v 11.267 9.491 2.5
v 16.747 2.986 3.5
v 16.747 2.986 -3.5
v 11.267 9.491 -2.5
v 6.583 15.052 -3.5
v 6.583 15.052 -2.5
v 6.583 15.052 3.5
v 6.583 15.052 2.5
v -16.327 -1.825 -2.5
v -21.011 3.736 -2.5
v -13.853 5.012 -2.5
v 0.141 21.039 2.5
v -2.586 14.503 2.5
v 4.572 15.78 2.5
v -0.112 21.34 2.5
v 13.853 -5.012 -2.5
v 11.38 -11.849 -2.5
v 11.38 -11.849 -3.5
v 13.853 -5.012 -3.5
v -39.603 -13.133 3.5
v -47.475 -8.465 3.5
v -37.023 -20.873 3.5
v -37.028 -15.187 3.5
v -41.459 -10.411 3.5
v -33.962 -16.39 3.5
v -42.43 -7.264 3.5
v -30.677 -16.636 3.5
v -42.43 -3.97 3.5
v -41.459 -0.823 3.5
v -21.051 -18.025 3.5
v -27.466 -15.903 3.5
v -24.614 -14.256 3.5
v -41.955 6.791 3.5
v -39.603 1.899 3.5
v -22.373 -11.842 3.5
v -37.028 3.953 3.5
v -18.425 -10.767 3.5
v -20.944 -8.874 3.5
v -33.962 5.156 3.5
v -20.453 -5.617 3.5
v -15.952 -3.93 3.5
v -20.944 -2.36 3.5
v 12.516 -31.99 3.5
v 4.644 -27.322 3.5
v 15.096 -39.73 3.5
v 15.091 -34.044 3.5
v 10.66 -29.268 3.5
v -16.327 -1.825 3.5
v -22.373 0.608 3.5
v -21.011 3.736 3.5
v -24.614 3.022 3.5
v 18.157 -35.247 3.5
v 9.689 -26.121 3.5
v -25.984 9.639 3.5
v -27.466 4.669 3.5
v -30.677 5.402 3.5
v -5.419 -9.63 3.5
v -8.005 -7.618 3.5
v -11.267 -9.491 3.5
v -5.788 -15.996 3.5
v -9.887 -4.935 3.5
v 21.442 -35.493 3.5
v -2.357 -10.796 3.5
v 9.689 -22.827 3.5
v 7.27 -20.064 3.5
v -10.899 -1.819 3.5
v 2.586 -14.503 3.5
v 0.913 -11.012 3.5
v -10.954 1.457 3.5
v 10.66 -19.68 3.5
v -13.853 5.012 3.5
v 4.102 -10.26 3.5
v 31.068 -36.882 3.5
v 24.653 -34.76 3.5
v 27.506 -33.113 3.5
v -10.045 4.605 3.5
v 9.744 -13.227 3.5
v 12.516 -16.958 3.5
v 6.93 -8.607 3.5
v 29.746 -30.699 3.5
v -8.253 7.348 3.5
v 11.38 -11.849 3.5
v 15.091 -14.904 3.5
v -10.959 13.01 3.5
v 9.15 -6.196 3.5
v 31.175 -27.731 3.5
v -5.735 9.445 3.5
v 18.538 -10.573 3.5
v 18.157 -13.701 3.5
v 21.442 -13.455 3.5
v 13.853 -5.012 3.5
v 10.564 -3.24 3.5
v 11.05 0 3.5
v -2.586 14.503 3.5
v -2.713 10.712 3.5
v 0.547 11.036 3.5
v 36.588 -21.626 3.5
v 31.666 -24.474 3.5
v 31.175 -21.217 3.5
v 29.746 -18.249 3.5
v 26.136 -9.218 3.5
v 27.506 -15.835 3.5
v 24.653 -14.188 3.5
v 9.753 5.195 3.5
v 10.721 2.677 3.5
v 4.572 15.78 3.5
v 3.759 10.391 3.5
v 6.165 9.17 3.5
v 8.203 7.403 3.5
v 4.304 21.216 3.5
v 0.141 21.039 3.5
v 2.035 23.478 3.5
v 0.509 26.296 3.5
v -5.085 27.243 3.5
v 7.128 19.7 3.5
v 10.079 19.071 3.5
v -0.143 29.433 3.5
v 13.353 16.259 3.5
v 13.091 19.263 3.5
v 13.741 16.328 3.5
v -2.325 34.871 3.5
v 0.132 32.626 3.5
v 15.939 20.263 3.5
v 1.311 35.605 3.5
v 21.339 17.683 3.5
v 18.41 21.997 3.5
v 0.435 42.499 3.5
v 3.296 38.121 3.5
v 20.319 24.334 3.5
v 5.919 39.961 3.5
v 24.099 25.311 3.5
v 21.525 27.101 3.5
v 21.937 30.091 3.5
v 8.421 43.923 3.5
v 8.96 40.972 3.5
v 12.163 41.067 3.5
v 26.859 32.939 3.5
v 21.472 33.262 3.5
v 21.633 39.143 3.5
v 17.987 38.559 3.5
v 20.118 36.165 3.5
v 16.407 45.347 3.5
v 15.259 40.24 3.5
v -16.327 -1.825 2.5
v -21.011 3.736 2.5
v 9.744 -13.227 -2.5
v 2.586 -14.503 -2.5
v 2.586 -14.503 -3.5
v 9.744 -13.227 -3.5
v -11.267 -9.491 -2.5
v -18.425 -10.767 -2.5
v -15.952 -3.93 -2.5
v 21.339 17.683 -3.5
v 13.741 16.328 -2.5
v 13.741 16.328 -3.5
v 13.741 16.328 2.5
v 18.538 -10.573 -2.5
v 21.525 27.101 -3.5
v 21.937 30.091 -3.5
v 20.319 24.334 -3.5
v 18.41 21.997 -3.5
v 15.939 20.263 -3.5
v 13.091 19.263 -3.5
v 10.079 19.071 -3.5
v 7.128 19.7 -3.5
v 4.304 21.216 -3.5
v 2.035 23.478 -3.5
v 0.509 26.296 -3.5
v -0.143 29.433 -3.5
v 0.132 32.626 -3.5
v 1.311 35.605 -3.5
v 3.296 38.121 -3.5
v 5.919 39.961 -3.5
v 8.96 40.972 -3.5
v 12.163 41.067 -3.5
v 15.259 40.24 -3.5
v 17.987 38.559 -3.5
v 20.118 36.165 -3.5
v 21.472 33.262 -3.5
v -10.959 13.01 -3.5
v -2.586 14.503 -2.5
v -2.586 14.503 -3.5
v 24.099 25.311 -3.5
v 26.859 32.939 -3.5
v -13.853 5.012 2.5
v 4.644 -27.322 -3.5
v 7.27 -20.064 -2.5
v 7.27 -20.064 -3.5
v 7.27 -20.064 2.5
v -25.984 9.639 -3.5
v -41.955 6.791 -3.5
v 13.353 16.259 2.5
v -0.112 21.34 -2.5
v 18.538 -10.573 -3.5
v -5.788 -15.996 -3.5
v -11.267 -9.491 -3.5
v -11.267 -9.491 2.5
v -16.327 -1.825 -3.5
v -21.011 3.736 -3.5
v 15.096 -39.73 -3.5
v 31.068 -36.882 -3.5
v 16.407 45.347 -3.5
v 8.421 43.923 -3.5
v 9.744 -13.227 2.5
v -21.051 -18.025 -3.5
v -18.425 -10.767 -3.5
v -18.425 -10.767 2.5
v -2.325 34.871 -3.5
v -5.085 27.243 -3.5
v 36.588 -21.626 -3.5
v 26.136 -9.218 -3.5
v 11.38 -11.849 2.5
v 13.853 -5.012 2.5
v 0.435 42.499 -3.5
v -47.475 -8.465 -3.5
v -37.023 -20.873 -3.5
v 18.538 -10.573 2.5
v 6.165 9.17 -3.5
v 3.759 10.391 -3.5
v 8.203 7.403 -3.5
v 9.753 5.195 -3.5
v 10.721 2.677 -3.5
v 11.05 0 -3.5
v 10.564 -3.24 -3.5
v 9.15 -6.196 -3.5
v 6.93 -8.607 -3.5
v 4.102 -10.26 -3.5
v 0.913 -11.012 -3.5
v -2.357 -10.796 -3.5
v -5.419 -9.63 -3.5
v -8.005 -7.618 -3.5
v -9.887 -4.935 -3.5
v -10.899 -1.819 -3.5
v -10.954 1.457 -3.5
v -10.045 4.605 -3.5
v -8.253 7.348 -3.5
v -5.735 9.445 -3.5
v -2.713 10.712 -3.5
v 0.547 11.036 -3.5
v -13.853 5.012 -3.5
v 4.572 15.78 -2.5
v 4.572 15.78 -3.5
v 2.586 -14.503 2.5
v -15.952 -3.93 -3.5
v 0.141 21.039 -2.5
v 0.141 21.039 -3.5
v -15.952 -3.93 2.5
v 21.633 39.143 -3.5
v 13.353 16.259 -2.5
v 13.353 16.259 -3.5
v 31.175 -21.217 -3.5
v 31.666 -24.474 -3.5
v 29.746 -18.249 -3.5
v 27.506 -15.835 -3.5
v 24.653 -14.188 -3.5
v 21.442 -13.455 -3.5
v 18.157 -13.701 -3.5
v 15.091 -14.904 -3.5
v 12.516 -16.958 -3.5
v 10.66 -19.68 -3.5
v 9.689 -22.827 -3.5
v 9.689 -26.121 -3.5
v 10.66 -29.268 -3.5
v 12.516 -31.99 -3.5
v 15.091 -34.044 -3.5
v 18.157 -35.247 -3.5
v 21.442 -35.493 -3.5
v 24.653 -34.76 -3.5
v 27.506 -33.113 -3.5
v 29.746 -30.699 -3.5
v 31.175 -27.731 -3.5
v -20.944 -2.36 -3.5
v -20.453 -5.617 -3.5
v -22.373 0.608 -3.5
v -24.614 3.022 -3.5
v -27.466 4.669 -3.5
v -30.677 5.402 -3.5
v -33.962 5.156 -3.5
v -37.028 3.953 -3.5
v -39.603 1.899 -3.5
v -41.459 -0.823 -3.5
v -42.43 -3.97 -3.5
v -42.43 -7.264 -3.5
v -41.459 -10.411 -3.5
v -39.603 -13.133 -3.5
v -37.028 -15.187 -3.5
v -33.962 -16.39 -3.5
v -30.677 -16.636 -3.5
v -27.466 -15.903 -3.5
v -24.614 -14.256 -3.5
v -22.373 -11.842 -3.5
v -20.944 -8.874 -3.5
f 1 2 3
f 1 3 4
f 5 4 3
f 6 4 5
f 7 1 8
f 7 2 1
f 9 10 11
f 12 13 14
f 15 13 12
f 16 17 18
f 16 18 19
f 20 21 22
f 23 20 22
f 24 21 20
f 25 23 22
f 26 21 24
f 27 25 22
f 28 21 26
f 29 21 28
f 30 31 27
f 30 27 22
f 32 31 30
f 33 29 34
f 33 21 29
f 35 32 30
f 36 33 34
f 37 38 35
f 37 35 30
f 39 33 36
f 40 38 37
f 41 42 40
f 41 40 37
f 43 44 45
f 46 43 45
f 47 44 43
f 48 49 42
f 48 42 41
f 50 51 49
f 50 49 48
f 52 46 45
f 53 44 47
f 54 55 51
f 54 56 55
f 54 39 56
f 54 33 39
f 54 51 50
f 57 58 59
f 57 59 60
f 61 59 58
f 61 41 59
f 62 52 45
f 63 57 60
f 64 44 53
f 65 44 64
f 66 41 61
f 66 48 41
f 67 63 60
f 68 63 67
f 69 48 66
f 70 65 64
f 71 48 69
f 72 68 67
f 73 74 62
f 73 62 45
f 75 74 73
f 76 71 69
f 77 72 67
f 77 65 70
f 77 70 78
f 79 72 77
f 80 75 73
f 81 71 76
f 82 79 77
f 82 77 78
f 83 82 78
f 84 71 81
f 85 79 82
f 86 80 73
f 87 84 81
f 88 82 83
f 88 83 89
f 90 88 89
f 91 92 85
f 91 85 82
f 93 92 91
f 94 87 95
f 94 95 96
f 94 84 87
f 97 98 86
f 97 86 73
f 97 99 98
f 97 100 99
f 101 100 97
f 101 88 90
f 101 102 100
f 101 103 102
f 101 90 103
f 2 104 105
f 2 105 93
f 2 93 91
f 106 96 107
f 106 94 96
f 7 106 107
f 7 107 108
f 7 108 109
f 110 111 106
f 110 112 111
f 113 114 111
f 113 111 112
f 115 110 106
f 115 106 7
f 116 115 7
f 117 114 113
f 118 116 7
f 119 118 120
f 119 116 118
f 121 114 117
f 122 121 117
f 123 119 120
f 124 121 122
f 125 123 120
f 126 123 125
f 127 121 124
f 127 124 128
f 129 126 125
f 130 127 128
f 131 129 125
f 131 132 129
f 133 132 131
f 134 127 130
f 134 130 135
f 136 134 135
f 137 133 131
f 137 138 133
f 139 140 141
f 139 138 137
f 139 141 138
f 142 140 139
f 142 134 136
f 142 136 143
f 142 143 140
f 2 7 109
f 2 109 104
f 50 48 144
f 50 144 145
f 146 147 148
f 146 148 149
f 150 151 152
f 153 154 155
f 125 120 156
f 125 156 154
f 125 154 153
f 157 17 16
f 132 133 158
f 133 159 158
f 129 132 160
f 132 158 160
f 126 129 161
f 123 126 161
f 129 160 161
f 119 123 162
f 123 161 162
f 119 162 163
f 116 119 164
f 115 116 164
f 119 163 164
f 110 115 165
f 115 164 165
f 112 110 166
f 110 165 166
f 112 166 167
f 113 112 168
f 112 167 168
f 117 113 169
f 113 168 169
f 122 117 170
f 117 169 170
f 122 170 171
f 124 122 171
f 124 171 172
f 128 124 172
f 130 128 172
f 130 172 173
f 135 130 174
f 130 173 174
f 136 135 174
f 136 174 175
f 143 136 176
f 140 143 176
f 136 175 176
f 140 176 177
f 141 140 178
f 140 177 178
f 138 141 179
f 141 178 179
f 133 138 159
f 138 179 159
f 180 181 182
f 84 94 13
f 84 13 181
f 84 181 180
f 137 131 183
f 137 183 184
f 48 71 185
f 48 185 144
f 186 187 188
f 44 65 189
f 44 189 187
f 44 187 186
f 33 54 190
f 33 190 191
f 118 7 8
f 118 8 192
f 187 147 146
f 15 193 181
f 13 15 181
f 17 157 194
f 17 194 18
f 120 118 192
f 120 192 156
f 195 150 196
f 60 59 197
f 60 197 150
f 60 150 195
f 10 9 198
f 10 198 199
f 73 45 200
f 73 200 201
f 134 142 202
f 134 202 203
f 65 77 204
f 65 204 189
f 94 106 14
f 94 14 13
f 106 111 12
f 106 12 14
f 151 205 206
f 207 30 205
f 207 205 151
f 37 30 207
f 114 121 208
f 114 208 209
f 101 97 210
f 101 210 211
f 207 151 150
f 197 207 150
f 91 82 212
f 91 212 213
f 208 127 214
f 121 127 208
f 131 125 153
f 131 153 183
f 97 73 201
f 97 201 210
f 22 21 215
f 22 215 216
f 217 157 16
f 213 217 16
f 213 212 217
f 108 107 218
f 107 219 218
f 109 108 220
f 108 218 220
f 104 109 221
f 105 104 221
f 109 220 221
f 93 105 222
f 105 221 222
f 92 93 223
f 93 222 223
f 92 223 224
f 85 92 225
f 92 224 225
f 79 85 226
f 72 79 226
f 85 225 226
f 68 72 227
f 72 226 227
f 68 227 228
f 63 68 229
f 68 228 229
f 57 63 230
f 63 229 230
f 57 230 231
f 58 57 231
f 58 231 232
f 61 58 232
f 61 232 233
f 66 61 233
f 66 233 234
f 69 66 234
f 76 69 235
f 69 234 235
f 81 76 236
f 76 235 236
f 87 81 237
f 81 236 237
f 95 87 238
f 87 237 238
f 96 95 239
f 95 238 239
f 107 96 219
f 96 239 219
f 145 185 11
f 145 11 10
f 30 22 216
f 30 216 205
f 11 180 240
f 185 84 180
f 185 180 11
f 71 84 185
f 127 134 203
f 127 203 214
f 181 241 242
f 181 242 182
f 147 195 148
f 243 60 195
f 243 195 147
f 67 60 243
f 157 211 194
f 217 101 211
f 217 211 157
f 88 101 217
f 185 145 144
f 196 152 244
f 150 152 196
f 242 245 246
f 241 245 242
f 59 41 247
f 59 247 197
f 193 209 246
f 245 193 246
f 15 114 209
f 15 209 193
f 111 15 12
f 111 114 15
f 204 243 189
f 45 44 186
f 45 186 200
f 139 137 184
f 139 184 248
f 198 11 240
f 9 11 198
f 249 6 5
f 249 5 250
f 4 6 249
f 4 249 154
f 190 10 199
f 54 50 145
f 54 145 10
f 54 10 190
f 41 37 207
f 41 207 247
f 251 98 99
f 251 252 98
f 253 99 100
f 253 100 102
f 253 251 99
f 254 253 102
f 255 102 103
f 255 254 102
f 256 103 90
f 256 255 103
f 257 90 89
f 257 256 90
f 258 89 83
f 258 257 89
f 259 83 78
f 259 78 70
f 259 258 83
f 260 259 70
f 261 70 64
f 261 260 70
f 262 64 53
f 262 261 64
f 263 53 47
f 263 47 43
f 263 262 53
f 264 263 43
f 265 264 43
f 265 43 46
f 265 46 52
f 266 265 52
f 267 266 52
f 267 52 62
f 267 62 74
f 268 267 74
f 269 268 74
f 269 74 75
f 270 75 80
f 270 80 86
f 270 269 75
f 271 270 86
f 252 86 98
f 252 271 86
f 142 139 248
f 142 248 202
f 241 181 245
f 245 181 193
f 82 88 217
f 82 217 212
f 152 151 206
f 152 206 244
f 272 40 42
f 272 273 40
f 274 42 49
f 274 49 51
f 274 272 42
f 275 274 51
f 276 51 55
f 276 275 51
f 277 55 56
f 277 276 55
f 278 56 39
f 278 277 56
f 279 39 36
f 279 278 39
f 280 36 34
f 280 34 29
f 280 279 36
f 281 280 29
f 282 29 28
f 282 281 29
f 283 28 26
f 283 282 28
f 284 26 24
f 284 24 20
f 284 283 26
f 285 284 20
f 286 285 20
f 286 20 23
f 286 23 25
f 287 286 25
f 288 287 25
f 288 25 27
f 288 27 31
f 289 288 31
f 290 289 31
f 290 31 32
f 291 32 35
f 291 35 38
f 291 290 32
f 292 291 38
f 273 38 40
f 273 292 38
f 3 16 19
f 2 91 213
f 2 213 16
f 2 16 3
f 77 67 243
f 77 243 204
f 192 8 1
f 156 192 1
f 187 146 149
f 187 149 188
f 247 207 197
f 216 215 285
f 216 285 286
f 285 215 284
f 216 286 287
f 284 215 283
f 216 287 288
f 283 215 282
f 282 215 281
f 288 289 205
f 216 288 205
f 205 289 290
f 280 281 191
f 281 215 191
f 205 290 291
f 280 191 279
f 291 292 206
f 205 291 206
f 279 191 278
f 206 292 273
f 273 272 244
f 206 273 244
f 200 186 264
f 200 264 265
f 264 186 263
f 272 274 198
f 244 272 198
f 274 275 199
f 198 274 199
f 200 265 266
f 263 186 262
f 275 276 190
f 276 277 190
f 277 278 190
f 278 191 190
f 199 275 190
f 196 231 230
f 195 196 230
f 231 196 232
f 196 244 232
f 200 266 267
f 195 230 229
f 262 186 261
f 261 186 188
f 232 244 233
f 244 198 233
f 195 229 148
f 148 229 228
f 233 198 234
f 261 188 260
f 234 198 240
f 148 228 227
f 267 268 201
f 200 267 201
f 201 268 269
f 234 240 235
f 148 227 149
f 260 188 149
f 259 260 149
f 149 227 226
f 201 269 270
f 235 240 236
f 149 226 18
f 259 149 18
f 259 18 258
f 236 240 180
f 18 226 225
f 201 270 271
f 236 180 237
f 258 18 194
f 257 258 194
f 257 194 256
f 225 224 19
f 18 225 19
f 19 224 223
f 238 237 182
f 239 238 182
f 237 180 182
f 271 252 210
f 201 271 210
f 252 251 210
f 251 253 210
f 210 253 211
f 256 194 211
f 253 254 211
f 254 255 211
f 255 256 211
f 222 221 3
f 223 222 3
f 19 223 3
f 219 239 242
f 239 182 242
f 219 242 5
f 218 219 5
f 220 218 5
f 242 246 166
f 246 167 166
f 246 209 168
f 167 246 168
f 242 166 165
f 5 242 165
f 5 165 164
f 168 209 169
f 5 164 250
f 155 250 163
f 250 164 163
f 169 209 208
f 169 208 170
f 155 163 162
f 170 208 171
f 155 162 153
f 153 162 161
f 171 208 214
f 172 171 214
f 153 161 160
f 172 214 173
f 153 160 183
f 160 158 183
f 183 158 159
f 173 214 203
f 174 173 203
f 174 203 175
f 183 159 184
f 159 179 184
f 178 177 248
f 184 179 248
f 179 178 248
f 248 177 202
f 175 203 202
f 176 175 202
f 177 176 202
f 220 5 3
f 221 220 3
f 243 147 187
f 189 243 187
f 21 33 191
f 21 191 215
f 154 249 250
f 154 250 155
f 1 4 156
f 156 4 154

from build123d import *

# Parameters (mm, degrees)
F0_R     = 11.05
F1_DEPTH = 3.5
F2_DEPTH = 2.5


with BuildPart() as f1:
    # F0 (on Top) → F1 (new body, symmetric)
    with BuildSketch(Plane.XY):
        with BuildLine():
            Line((16.4067340595, 45.3467654298), (8.4209065052, 43.9228967168))
            ThreePointArc((8.4209065052, 43.9228967168), (15.6672457553, 43.3028857057), (21.6327540042, 39.1427706216))
            Line((21.6327540042, 39.1427706216), (16.4067340595, 45.3467654298))
        make_face()
        with BuildLine():
            Line((0.4350802259, 42.4990282311), (-2.3247269809, 34.8711645999))
            ThreePointArc((-2.3247269809, 34.8711645999), (1.8353876304, 40.8366725376), (8.4209065052, 43.9228967168))
            Line((8.4209065052, 43.9228967168), (0.4350802259, 42.4990282311))
        make_face()
        with BuildLine():
            ThreePointArc((24.9371199001, 30.0910388701), (24.7259953173, 27.6645131258), (24.0989665638, 25.3109125396))
            Line((24.0989665638, 25.3109125396), (26.8587737337, 32.9387760688))
            Line((26.8587737337, 32.9387760688), (21.6327540042, 39.1427706216))
            ThreePointArc((21.6327540042, 39.1427706216), (24.0852004265, 34.9090436873), (24.9371199001, 30.0910388701))
        make_face()
        with BuildLine():
            Line((-5.0845339335, 27.2433016714), (-0.112226606, 21.3404981668))
            Line((-0.112226606, 21.3404981668), (-0.1100221461, 21.3465910994))
            ThreePointArc((-0.1100221461, 21.3465910994), (-2.9782076587, 27.8205341493), (-2.3247269809, 34.8711645999))
            Line((-2.3247269809, 34.8711645999), (-5.0845339335, 27.2433016714))
        make_face()
        with BuildLine():
            Line((13.7432325819, 16.334399733), (13.741028122, 16.3283068004))
            Line((13.741028122, 16.3283068004), (21.3391595743, 17.6830495091))
            Line((21.3391595743, 17.6830495091), (24.0989665638, 25.3109125396))
            ThreePointArc((24.0989665638, 25.3109125396), (20.0897974955, 19.474390384), (13.7432325819, 16.334399733))
        make_face()
        with BuildLine():
            Line((-0.112226606, 21.3404981668), (0.1414857049, 21.0393072268))
            ThreePointArc((0.1414857049, 21.0393072268), (0.0146461468, 21.1920605869), (-0.1100221461, 21.3465910994))
            Line((-0.1100221461, 21.3465910994), (-0.112226606, 21.3404981668))
        make_face()
        with BuildLine():
            ThreePointArc((13.7432325819, 16.334399733), (13.5485483413, 16.2954128005), (13.3533326046, 16.2591809003))
            Line((13.3533326046, 16.2591809003), (13.741028122, 16.3283068004))
            Line((13.741028122, 16.3283068004), (13.7432325819, 16.334399733))
        make_face()
        Polygon((18.5375268448, -10.5730579916), (11.3795390219, -11.8493233304), (10.9594646934, -13.0103717128), (9.743930135, -13.227100864), (7.2702144289, -20.064232828), (4.6443903041, -27.3217790413), (15.0964299783, -39.7297684023), (31.0680838119, -36.8820312036), (36.5876979713, -21.6263046439), (26.1356582971, -9.2183152829), align=None)
        with Locations((20.6160441377, -24.4740418426)):
            Circle(F0_R, mode=Mode.SUBTRACT)
        Polygon((-16.7470447626, -2.98598898), (-16.3269704341, -1.8249405976), (-21.0112425509, 3.7359260276), (-25.9835498784, 9.6387295322), (-41.955203712, 6.7909923335), (-47.4748178714, -8.4647342262), (-37.0227781972, -20.8727235872), (-21.0511243636, -18.0249863885), (-18.4253002388, -10.7674401752), (-15.9515845328, -3.9303082112), align=None)
        with Locations((-31.5031640378, -5.6169970275)):
            Circle(F0_R, mode=Mode.SUBTRACT)
        with BuildLine():
            ThreePointArc((0.1414857049, 21.0393072268), (2.850394978, 18.5665626335), (6.106993819, 16.8791921162))
            ThreePointArc((6.106993819, 16.8791921162), (9.6893501995, 16.092187212), (13.3533326046, 16.2591809003))
            ThreePointArc((13.3533326046, 16.2591809003), (13.5485483413, 16.2954128005), (13.7432325819, 16.334399733))
            ThreePointArc((13.7432325819, 16.334399733), (20.0897974955, 19.474390384), (24.0989665638, 25.3109125396))
            ThreePointArc((24.0989665638, 25.3109125396), (24.7259953173, 27.6645131258), (24.9371199001, 30.0910388701))
            ThreePointArc((24.9371199001, 30.0910388701), (24.0852004265, 34.9090436873), (21.6327540042, 39.1427706216))
            ThreePointArc((21.6327540042, 39.1427706216), (15.6672457553, 43.3028857057), (8.4209065052, 43.9228967168))
            ThreePointArc((8.4209065052, 43.9228967168), (1.8353876304, 40.8366725376), (-2.3247269809, 34.8711645999))
            ThreePointArc((-2.3247269809, 34.8711645999), (-2.9782076587, 27.8205341493), (-0.1100221461, 21.3465910994))
            ThreePointArc((-0.1100221461, 21.3465910994), (0.0146461468, 21.1920605869), (0.1414857049, 21.0393072268))
        make_face()
        with BuildLine():
            ThreePointArc((21.9371199001, 30.0910388701), (17.2337915702, 21.0454731767), (7.1276613096, 19.7002270103))
            ThreePointArc((7.1276613096, 19.7002270103), (4.5404482301, 39.1366045634), (21.9371199001, 30.0910388701))
        make_face(mode=Mode.SUBTRACT)
        Polygon((6.5830402991, 15.0520414616), (5.3675057407, 14.8353123104), (4.5720455108, 15.7796315416), (-2.5859423121, 14.5033662028), (-10.9594646934, 13.0103717128), (-13.853254728, 5.0121913664), (-16.3269704341, -1.8249405976), (-15.5315102042, -2.7692598288), (-15.9515845328, -3.9303082112), (-11.2673124159, -9.4911748364), (-5.7875800692, -15.9963606927), (2.5859423121, -14.5033662028), (9.743930135, -13.227100864), (10.1640044635, -12.0660524816), (11.3795390219, -11.8493233304), (13.853254728, -5.0121913664), (16.7470447626, 2.98598898), (11.2673124159, 9.4911748364), align=None)
        with BuildLine():
            ThreePointArc((3.7594585905, 10.3908118598), (9.0455656933, 6.3466716701), (11.05, 0))
            ThreePointArc((11.05, 0), (-9.0455656933, -6.3466716701), (3.7594585905, 10.3908118598))
        make_face(mode=Mode.SUBTRACT)
        with BuildLine():
            Line((6.106993819, 16.8791921162), (5.7875800692, 15.9963606927))
            Line((5.7875800692, 15.9963606927), (6.5830402991, 15.0520414616))
            Line((6.5830402991, 15.0520414616), (13.3533326046, 16.2591809003))
            ThreePointArc((13.3533326046, 16.2591809003), (9.6893501995, 16.092187212), (6.106993819, 16.8791921162))
        make_face()
        with BuildLine():
            Line((4.5720455108, 15.7796315416), (5.7875800692, 15.9963606927))
            Line((5.7875800692, 15.9963606927), (6.106993819, 16.8791921162))
            ThreePointArc((6.106993819, 16.8791921162), (2.850394978, 18.5665626335), (0.1414857049, 21.0393072268))
            Line((0.1414857049, 21.0393072268), (4.5720455108, 15.7796315416))
        make_face()
        Polygon((4.5720455108, 15.7796315416), (5.3675057407, 14.8353123104), (5.7875800692, 15.9963606927), align=None)
        Polygon((5.7875800692, 15.9963606927), (5.3675057407, 14.8353123104), (6.5830402991, 15.0520414616), align=None)
        Polygon((10.9594646934, -13.0103717128), (11.3795390219, -11.8493233304), (10.1640044635, -12.0660524816), (9.743930135, -13.227100864), align=None)
        Polygon((-15.5315102042, -2.7692598288), (-16.3269704341, -1.8249405976), (-16.7470447626, -2.98598898), (-15.9515845328, -3.9303082112), align=None)
    extrude(amount=F1_DEPTH, both=True)

    # F0 (on Top) → F2 (join, symmetric)
    with BuildSketch(Plane.XY):
        Polygon((-2.5859423121, 14.5033662028), (4.5720455108, 15.7796315416), (0.1414857049, 21.0393072268), (-0.112226606, 21.3404981668), align=None)
        Polygon((13.3533326046, 16.2591809003), (6.5830402991, 15.0520414616), (11.2673124159, 9.4911748364), (13.741028122, 16.3283068004), align=None)
        Polygon((18.5375268448, -10.5730579916), (13.853254728, -5.0121913664), (11.3795390219, -11.8493233304), align=None)
        Polygon((7.2702144289, -20.064232828), (9.743930135, -13.227100864), (2.5859423121, -14.5033662028), align=None)
        Polygon((-11.2673124159, -9.4911748364), (-15.9515845328, -3.9303082112), (-18.4253002388, -10.7674401752), align=None)
        Polygon((-16.3269704341, -1.8249405976), (-13.853254728, 5.0121913664), (-21.0112425509, 3.7359260276), align=None)
    extrude(amount=F2_DEPTH, both=True)


solid = f1.part
